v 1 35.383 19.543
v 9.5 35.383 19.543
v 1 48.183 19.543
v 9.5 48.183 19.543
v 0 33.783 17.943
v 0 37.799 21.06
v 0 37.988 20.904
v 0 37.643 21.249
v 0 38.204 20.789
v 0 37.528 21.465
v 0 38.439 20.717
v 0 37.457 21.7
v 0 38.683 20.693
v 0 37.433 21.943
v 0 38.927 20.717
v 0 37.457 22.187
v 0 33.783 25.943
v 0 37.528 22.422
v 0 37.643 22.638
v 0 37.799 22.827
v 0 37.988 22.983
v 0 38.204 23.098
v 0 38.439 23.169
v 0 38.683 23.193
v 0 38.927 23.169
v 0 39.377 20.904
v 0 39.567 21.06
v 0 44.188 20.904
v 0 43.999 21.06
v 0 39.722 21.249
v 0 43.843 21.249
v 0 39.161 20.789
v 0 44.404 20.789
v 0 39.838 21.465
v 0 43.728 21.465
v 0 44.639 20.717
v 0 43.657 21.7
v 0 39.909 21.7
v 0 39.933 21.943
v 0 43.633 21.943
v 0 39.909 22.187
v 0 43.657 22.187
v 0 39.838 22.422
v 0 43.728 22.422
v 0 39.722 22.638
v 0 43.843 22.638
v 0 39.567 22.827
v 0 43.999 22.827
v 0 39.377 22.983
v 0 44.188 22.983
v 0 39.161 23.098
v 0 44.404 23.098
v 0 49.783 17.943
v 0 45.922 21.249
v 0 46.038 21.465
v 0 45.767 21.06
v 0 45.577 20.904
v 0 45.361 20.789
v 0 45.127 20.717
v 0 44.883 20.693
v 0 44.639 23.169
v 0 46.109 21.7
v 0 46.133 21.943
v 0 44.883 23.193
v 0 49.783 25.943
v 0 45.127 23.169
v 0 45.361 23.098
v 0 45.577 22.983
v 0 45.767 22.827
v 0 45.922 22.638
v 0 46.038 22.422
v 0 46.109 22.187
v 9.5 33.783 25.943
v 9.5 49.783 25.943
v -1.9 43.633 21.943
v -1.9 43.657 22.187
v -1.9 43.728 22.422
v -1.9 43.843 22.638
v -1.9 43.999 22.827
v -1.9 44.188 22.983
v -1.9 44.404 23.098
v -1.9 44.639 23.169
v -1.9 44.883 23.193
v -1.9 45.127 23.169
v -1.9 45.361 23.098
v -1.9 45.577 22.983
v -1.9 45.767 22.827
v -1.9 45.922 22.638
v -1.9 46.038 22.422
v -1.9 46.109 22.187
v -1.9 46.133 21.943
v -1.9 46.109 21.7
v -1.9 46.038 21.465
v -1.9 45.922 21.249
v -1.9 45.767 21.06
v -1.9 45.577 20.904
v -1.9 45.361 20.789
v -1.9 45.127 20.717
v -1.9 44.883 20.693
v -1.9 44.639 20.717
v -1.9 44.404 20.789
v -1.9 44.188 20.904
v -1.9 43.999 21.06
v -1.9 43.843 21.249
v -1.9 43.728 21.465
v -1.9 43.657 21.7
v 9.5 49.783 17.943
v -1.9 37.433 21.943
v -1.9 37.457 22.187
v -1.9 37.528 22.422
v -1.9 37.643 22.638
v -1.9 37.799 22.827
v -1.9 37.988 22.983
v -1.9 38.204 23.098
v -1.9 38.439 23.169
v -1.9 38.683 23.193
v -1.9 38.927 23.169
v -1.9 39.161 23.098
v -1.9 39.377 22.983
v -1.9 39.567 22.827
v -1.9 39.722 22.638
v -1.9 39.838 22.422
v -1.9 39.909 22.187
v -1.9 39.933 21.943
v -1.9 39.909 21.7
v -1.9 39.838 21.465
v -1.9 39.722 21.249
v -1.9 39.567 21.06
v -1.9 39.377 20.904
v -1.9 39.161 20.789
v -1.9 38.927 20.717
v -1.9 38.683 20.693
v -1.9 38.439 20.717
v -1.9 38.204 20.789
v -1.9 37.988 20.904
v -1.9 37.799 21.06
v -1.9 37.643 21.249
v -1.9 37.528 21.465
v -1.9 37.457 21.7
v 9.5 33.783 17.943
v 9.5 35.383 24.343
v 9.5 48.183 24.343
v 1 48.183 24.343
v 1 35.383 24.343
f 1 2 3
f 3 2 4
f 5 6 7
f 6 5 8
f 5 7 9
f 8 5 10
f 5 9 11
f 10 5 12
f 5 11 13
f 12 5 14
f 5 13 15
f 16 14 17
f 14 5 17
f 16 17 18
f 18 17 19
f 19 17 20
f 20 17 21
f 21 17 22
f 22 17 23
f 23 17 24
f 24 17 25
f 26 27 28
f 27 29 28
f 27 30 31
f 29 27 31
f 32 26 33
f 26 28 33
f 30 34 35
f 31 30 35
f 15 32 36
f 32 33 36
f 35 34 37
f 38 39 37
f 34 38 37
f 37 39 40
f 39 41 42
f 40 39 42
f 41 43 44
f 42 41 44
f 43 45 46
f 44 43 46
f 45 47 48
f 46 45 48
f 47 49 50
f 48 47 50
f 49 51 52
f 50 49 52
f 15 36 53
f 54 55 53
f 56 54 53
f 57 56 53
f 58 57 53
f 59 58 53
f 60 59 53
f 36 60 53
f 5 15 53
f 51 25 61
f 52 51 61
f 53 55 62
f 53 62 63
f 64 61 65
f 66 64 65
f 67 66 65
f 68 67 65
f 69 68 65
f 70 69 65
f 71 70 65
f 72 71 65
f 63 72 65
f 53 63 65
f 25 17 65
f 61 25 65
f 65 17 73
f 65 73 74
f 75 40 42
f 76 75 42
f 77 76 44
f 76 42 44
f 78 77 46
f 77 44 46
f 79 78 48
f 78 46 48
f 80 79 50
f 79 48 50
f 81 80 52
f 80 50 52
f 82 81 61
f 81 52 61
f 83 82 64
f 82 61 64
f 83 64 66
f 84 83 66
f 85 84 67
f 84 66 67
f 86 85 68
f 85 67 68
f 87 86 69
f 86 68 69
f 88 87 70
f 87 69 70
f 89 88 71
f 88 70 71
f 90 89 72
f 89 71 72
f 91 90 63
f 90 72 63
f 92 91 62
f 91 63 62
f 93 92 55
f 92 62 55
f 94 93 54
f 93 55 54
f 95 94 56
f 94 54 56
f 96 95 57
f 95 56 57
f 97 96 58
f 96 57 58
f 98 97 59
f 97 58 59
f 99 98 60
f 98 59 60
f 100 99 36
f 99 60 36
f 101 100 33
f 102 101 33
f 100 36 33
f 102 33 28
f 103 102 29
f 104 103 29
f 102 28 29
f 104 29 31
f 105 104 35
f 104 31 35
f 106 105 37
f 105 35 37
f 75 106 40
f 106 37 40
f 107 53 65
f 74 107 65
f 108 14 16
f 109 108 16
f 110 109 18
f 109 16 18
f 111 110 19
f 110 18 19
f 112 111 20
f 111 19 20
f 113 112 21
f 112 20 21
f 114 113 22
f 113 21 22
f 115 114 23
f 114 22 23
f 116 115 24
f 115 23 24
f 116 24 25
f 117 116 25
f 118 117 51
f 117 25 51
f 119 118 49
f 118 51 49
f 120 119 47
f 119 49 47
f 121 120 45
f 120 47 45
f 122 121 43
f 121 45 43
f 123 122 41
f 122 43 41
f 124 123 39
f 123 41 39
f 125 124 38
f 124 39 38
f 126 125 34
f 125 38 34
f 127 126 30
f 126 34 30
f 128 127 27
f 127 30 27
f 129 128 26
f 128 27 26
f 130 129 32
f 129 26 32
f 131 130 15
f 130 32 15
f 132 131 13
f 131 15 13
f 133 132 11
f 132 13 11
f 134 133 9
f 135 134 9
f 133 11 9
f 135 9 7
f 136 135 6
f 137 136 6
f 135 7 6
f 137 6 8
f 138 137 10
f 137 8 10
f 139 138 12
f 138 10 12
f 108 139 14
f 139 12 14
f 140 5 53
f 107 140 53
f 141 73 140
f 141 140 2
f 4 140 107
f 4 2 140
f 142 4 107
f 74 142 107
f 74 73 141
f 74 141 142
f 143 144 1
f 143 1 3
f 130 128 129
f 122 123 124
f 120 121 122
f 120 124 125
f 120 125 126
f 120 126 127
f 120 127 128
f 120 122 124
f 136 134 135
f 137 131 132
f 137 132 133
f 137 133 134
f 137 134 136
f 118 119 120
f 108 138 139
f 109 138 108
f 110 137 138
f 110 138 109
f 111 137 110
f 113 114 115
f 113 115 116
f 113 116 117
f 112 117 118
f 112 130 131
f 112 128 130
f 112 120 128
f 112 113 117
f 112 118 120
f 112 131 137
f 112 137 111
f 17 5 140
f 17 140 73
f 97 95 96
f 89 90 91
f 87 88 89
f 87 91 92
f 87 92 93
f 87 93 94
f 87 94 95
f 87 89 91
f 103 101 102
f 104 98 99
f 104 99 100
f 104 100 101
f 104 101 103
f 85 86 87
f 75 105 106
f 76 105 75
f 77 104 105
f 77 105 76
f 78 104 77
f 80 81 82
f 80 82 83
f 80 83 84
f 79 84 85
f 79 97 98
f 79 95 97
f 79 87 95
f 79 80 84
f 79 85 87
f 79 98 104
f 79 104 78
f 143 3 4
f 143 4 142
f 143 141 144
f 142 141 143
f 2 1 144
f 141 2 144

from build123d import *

# Parameters (mm, degrees)
F0_W     = 16
F0_H     = 8
F1_DEPTH = 9.5
F2_R     = 1.25
F3_DEPTH = 1.9
F4_W     = 12.8
F4_H     = 4.8
F6_DEPTH = 8.5


# Not quite as in the source:
# - a feature names something its author has since deleted; it is built from what else it names


with BuildPart() as f1:
    # F0 (on Right) → F1 (new body)
    with BuildSketch(Plane.YZ):
        with Locations((41.7828243226, 21.9434328547)):
            Rectangle(F0_W, F0_H)
    extrude(amount=F1_DEPTH)

    # F2 (on face) → F3 (join)
    with BuildSketch(Plane(origin=(0, 0, 0), x_dir=(0, -1, 0), z_dir=(-1, 0, 0))):
        with Locations((-44.8828243226, 21.9434328547)):
            Circle(F2_R)
        with Locations((-38.6828243226, 21.9434328547)):
            Circle(F2_R)
    extrude(amount=F3_DEPTH)

    # F4 (on face) → F6 (cut)
    with BuildSketch(Plane.YZ.offset(9.5)):
        with Locations((41.7828243226, 21.9434328547)):
            Rectangle(F4_W, F4_H)
    extrude(amount=-F6_DEPTH, mode=Mode.SUBTRACT)


solid = f1.part
